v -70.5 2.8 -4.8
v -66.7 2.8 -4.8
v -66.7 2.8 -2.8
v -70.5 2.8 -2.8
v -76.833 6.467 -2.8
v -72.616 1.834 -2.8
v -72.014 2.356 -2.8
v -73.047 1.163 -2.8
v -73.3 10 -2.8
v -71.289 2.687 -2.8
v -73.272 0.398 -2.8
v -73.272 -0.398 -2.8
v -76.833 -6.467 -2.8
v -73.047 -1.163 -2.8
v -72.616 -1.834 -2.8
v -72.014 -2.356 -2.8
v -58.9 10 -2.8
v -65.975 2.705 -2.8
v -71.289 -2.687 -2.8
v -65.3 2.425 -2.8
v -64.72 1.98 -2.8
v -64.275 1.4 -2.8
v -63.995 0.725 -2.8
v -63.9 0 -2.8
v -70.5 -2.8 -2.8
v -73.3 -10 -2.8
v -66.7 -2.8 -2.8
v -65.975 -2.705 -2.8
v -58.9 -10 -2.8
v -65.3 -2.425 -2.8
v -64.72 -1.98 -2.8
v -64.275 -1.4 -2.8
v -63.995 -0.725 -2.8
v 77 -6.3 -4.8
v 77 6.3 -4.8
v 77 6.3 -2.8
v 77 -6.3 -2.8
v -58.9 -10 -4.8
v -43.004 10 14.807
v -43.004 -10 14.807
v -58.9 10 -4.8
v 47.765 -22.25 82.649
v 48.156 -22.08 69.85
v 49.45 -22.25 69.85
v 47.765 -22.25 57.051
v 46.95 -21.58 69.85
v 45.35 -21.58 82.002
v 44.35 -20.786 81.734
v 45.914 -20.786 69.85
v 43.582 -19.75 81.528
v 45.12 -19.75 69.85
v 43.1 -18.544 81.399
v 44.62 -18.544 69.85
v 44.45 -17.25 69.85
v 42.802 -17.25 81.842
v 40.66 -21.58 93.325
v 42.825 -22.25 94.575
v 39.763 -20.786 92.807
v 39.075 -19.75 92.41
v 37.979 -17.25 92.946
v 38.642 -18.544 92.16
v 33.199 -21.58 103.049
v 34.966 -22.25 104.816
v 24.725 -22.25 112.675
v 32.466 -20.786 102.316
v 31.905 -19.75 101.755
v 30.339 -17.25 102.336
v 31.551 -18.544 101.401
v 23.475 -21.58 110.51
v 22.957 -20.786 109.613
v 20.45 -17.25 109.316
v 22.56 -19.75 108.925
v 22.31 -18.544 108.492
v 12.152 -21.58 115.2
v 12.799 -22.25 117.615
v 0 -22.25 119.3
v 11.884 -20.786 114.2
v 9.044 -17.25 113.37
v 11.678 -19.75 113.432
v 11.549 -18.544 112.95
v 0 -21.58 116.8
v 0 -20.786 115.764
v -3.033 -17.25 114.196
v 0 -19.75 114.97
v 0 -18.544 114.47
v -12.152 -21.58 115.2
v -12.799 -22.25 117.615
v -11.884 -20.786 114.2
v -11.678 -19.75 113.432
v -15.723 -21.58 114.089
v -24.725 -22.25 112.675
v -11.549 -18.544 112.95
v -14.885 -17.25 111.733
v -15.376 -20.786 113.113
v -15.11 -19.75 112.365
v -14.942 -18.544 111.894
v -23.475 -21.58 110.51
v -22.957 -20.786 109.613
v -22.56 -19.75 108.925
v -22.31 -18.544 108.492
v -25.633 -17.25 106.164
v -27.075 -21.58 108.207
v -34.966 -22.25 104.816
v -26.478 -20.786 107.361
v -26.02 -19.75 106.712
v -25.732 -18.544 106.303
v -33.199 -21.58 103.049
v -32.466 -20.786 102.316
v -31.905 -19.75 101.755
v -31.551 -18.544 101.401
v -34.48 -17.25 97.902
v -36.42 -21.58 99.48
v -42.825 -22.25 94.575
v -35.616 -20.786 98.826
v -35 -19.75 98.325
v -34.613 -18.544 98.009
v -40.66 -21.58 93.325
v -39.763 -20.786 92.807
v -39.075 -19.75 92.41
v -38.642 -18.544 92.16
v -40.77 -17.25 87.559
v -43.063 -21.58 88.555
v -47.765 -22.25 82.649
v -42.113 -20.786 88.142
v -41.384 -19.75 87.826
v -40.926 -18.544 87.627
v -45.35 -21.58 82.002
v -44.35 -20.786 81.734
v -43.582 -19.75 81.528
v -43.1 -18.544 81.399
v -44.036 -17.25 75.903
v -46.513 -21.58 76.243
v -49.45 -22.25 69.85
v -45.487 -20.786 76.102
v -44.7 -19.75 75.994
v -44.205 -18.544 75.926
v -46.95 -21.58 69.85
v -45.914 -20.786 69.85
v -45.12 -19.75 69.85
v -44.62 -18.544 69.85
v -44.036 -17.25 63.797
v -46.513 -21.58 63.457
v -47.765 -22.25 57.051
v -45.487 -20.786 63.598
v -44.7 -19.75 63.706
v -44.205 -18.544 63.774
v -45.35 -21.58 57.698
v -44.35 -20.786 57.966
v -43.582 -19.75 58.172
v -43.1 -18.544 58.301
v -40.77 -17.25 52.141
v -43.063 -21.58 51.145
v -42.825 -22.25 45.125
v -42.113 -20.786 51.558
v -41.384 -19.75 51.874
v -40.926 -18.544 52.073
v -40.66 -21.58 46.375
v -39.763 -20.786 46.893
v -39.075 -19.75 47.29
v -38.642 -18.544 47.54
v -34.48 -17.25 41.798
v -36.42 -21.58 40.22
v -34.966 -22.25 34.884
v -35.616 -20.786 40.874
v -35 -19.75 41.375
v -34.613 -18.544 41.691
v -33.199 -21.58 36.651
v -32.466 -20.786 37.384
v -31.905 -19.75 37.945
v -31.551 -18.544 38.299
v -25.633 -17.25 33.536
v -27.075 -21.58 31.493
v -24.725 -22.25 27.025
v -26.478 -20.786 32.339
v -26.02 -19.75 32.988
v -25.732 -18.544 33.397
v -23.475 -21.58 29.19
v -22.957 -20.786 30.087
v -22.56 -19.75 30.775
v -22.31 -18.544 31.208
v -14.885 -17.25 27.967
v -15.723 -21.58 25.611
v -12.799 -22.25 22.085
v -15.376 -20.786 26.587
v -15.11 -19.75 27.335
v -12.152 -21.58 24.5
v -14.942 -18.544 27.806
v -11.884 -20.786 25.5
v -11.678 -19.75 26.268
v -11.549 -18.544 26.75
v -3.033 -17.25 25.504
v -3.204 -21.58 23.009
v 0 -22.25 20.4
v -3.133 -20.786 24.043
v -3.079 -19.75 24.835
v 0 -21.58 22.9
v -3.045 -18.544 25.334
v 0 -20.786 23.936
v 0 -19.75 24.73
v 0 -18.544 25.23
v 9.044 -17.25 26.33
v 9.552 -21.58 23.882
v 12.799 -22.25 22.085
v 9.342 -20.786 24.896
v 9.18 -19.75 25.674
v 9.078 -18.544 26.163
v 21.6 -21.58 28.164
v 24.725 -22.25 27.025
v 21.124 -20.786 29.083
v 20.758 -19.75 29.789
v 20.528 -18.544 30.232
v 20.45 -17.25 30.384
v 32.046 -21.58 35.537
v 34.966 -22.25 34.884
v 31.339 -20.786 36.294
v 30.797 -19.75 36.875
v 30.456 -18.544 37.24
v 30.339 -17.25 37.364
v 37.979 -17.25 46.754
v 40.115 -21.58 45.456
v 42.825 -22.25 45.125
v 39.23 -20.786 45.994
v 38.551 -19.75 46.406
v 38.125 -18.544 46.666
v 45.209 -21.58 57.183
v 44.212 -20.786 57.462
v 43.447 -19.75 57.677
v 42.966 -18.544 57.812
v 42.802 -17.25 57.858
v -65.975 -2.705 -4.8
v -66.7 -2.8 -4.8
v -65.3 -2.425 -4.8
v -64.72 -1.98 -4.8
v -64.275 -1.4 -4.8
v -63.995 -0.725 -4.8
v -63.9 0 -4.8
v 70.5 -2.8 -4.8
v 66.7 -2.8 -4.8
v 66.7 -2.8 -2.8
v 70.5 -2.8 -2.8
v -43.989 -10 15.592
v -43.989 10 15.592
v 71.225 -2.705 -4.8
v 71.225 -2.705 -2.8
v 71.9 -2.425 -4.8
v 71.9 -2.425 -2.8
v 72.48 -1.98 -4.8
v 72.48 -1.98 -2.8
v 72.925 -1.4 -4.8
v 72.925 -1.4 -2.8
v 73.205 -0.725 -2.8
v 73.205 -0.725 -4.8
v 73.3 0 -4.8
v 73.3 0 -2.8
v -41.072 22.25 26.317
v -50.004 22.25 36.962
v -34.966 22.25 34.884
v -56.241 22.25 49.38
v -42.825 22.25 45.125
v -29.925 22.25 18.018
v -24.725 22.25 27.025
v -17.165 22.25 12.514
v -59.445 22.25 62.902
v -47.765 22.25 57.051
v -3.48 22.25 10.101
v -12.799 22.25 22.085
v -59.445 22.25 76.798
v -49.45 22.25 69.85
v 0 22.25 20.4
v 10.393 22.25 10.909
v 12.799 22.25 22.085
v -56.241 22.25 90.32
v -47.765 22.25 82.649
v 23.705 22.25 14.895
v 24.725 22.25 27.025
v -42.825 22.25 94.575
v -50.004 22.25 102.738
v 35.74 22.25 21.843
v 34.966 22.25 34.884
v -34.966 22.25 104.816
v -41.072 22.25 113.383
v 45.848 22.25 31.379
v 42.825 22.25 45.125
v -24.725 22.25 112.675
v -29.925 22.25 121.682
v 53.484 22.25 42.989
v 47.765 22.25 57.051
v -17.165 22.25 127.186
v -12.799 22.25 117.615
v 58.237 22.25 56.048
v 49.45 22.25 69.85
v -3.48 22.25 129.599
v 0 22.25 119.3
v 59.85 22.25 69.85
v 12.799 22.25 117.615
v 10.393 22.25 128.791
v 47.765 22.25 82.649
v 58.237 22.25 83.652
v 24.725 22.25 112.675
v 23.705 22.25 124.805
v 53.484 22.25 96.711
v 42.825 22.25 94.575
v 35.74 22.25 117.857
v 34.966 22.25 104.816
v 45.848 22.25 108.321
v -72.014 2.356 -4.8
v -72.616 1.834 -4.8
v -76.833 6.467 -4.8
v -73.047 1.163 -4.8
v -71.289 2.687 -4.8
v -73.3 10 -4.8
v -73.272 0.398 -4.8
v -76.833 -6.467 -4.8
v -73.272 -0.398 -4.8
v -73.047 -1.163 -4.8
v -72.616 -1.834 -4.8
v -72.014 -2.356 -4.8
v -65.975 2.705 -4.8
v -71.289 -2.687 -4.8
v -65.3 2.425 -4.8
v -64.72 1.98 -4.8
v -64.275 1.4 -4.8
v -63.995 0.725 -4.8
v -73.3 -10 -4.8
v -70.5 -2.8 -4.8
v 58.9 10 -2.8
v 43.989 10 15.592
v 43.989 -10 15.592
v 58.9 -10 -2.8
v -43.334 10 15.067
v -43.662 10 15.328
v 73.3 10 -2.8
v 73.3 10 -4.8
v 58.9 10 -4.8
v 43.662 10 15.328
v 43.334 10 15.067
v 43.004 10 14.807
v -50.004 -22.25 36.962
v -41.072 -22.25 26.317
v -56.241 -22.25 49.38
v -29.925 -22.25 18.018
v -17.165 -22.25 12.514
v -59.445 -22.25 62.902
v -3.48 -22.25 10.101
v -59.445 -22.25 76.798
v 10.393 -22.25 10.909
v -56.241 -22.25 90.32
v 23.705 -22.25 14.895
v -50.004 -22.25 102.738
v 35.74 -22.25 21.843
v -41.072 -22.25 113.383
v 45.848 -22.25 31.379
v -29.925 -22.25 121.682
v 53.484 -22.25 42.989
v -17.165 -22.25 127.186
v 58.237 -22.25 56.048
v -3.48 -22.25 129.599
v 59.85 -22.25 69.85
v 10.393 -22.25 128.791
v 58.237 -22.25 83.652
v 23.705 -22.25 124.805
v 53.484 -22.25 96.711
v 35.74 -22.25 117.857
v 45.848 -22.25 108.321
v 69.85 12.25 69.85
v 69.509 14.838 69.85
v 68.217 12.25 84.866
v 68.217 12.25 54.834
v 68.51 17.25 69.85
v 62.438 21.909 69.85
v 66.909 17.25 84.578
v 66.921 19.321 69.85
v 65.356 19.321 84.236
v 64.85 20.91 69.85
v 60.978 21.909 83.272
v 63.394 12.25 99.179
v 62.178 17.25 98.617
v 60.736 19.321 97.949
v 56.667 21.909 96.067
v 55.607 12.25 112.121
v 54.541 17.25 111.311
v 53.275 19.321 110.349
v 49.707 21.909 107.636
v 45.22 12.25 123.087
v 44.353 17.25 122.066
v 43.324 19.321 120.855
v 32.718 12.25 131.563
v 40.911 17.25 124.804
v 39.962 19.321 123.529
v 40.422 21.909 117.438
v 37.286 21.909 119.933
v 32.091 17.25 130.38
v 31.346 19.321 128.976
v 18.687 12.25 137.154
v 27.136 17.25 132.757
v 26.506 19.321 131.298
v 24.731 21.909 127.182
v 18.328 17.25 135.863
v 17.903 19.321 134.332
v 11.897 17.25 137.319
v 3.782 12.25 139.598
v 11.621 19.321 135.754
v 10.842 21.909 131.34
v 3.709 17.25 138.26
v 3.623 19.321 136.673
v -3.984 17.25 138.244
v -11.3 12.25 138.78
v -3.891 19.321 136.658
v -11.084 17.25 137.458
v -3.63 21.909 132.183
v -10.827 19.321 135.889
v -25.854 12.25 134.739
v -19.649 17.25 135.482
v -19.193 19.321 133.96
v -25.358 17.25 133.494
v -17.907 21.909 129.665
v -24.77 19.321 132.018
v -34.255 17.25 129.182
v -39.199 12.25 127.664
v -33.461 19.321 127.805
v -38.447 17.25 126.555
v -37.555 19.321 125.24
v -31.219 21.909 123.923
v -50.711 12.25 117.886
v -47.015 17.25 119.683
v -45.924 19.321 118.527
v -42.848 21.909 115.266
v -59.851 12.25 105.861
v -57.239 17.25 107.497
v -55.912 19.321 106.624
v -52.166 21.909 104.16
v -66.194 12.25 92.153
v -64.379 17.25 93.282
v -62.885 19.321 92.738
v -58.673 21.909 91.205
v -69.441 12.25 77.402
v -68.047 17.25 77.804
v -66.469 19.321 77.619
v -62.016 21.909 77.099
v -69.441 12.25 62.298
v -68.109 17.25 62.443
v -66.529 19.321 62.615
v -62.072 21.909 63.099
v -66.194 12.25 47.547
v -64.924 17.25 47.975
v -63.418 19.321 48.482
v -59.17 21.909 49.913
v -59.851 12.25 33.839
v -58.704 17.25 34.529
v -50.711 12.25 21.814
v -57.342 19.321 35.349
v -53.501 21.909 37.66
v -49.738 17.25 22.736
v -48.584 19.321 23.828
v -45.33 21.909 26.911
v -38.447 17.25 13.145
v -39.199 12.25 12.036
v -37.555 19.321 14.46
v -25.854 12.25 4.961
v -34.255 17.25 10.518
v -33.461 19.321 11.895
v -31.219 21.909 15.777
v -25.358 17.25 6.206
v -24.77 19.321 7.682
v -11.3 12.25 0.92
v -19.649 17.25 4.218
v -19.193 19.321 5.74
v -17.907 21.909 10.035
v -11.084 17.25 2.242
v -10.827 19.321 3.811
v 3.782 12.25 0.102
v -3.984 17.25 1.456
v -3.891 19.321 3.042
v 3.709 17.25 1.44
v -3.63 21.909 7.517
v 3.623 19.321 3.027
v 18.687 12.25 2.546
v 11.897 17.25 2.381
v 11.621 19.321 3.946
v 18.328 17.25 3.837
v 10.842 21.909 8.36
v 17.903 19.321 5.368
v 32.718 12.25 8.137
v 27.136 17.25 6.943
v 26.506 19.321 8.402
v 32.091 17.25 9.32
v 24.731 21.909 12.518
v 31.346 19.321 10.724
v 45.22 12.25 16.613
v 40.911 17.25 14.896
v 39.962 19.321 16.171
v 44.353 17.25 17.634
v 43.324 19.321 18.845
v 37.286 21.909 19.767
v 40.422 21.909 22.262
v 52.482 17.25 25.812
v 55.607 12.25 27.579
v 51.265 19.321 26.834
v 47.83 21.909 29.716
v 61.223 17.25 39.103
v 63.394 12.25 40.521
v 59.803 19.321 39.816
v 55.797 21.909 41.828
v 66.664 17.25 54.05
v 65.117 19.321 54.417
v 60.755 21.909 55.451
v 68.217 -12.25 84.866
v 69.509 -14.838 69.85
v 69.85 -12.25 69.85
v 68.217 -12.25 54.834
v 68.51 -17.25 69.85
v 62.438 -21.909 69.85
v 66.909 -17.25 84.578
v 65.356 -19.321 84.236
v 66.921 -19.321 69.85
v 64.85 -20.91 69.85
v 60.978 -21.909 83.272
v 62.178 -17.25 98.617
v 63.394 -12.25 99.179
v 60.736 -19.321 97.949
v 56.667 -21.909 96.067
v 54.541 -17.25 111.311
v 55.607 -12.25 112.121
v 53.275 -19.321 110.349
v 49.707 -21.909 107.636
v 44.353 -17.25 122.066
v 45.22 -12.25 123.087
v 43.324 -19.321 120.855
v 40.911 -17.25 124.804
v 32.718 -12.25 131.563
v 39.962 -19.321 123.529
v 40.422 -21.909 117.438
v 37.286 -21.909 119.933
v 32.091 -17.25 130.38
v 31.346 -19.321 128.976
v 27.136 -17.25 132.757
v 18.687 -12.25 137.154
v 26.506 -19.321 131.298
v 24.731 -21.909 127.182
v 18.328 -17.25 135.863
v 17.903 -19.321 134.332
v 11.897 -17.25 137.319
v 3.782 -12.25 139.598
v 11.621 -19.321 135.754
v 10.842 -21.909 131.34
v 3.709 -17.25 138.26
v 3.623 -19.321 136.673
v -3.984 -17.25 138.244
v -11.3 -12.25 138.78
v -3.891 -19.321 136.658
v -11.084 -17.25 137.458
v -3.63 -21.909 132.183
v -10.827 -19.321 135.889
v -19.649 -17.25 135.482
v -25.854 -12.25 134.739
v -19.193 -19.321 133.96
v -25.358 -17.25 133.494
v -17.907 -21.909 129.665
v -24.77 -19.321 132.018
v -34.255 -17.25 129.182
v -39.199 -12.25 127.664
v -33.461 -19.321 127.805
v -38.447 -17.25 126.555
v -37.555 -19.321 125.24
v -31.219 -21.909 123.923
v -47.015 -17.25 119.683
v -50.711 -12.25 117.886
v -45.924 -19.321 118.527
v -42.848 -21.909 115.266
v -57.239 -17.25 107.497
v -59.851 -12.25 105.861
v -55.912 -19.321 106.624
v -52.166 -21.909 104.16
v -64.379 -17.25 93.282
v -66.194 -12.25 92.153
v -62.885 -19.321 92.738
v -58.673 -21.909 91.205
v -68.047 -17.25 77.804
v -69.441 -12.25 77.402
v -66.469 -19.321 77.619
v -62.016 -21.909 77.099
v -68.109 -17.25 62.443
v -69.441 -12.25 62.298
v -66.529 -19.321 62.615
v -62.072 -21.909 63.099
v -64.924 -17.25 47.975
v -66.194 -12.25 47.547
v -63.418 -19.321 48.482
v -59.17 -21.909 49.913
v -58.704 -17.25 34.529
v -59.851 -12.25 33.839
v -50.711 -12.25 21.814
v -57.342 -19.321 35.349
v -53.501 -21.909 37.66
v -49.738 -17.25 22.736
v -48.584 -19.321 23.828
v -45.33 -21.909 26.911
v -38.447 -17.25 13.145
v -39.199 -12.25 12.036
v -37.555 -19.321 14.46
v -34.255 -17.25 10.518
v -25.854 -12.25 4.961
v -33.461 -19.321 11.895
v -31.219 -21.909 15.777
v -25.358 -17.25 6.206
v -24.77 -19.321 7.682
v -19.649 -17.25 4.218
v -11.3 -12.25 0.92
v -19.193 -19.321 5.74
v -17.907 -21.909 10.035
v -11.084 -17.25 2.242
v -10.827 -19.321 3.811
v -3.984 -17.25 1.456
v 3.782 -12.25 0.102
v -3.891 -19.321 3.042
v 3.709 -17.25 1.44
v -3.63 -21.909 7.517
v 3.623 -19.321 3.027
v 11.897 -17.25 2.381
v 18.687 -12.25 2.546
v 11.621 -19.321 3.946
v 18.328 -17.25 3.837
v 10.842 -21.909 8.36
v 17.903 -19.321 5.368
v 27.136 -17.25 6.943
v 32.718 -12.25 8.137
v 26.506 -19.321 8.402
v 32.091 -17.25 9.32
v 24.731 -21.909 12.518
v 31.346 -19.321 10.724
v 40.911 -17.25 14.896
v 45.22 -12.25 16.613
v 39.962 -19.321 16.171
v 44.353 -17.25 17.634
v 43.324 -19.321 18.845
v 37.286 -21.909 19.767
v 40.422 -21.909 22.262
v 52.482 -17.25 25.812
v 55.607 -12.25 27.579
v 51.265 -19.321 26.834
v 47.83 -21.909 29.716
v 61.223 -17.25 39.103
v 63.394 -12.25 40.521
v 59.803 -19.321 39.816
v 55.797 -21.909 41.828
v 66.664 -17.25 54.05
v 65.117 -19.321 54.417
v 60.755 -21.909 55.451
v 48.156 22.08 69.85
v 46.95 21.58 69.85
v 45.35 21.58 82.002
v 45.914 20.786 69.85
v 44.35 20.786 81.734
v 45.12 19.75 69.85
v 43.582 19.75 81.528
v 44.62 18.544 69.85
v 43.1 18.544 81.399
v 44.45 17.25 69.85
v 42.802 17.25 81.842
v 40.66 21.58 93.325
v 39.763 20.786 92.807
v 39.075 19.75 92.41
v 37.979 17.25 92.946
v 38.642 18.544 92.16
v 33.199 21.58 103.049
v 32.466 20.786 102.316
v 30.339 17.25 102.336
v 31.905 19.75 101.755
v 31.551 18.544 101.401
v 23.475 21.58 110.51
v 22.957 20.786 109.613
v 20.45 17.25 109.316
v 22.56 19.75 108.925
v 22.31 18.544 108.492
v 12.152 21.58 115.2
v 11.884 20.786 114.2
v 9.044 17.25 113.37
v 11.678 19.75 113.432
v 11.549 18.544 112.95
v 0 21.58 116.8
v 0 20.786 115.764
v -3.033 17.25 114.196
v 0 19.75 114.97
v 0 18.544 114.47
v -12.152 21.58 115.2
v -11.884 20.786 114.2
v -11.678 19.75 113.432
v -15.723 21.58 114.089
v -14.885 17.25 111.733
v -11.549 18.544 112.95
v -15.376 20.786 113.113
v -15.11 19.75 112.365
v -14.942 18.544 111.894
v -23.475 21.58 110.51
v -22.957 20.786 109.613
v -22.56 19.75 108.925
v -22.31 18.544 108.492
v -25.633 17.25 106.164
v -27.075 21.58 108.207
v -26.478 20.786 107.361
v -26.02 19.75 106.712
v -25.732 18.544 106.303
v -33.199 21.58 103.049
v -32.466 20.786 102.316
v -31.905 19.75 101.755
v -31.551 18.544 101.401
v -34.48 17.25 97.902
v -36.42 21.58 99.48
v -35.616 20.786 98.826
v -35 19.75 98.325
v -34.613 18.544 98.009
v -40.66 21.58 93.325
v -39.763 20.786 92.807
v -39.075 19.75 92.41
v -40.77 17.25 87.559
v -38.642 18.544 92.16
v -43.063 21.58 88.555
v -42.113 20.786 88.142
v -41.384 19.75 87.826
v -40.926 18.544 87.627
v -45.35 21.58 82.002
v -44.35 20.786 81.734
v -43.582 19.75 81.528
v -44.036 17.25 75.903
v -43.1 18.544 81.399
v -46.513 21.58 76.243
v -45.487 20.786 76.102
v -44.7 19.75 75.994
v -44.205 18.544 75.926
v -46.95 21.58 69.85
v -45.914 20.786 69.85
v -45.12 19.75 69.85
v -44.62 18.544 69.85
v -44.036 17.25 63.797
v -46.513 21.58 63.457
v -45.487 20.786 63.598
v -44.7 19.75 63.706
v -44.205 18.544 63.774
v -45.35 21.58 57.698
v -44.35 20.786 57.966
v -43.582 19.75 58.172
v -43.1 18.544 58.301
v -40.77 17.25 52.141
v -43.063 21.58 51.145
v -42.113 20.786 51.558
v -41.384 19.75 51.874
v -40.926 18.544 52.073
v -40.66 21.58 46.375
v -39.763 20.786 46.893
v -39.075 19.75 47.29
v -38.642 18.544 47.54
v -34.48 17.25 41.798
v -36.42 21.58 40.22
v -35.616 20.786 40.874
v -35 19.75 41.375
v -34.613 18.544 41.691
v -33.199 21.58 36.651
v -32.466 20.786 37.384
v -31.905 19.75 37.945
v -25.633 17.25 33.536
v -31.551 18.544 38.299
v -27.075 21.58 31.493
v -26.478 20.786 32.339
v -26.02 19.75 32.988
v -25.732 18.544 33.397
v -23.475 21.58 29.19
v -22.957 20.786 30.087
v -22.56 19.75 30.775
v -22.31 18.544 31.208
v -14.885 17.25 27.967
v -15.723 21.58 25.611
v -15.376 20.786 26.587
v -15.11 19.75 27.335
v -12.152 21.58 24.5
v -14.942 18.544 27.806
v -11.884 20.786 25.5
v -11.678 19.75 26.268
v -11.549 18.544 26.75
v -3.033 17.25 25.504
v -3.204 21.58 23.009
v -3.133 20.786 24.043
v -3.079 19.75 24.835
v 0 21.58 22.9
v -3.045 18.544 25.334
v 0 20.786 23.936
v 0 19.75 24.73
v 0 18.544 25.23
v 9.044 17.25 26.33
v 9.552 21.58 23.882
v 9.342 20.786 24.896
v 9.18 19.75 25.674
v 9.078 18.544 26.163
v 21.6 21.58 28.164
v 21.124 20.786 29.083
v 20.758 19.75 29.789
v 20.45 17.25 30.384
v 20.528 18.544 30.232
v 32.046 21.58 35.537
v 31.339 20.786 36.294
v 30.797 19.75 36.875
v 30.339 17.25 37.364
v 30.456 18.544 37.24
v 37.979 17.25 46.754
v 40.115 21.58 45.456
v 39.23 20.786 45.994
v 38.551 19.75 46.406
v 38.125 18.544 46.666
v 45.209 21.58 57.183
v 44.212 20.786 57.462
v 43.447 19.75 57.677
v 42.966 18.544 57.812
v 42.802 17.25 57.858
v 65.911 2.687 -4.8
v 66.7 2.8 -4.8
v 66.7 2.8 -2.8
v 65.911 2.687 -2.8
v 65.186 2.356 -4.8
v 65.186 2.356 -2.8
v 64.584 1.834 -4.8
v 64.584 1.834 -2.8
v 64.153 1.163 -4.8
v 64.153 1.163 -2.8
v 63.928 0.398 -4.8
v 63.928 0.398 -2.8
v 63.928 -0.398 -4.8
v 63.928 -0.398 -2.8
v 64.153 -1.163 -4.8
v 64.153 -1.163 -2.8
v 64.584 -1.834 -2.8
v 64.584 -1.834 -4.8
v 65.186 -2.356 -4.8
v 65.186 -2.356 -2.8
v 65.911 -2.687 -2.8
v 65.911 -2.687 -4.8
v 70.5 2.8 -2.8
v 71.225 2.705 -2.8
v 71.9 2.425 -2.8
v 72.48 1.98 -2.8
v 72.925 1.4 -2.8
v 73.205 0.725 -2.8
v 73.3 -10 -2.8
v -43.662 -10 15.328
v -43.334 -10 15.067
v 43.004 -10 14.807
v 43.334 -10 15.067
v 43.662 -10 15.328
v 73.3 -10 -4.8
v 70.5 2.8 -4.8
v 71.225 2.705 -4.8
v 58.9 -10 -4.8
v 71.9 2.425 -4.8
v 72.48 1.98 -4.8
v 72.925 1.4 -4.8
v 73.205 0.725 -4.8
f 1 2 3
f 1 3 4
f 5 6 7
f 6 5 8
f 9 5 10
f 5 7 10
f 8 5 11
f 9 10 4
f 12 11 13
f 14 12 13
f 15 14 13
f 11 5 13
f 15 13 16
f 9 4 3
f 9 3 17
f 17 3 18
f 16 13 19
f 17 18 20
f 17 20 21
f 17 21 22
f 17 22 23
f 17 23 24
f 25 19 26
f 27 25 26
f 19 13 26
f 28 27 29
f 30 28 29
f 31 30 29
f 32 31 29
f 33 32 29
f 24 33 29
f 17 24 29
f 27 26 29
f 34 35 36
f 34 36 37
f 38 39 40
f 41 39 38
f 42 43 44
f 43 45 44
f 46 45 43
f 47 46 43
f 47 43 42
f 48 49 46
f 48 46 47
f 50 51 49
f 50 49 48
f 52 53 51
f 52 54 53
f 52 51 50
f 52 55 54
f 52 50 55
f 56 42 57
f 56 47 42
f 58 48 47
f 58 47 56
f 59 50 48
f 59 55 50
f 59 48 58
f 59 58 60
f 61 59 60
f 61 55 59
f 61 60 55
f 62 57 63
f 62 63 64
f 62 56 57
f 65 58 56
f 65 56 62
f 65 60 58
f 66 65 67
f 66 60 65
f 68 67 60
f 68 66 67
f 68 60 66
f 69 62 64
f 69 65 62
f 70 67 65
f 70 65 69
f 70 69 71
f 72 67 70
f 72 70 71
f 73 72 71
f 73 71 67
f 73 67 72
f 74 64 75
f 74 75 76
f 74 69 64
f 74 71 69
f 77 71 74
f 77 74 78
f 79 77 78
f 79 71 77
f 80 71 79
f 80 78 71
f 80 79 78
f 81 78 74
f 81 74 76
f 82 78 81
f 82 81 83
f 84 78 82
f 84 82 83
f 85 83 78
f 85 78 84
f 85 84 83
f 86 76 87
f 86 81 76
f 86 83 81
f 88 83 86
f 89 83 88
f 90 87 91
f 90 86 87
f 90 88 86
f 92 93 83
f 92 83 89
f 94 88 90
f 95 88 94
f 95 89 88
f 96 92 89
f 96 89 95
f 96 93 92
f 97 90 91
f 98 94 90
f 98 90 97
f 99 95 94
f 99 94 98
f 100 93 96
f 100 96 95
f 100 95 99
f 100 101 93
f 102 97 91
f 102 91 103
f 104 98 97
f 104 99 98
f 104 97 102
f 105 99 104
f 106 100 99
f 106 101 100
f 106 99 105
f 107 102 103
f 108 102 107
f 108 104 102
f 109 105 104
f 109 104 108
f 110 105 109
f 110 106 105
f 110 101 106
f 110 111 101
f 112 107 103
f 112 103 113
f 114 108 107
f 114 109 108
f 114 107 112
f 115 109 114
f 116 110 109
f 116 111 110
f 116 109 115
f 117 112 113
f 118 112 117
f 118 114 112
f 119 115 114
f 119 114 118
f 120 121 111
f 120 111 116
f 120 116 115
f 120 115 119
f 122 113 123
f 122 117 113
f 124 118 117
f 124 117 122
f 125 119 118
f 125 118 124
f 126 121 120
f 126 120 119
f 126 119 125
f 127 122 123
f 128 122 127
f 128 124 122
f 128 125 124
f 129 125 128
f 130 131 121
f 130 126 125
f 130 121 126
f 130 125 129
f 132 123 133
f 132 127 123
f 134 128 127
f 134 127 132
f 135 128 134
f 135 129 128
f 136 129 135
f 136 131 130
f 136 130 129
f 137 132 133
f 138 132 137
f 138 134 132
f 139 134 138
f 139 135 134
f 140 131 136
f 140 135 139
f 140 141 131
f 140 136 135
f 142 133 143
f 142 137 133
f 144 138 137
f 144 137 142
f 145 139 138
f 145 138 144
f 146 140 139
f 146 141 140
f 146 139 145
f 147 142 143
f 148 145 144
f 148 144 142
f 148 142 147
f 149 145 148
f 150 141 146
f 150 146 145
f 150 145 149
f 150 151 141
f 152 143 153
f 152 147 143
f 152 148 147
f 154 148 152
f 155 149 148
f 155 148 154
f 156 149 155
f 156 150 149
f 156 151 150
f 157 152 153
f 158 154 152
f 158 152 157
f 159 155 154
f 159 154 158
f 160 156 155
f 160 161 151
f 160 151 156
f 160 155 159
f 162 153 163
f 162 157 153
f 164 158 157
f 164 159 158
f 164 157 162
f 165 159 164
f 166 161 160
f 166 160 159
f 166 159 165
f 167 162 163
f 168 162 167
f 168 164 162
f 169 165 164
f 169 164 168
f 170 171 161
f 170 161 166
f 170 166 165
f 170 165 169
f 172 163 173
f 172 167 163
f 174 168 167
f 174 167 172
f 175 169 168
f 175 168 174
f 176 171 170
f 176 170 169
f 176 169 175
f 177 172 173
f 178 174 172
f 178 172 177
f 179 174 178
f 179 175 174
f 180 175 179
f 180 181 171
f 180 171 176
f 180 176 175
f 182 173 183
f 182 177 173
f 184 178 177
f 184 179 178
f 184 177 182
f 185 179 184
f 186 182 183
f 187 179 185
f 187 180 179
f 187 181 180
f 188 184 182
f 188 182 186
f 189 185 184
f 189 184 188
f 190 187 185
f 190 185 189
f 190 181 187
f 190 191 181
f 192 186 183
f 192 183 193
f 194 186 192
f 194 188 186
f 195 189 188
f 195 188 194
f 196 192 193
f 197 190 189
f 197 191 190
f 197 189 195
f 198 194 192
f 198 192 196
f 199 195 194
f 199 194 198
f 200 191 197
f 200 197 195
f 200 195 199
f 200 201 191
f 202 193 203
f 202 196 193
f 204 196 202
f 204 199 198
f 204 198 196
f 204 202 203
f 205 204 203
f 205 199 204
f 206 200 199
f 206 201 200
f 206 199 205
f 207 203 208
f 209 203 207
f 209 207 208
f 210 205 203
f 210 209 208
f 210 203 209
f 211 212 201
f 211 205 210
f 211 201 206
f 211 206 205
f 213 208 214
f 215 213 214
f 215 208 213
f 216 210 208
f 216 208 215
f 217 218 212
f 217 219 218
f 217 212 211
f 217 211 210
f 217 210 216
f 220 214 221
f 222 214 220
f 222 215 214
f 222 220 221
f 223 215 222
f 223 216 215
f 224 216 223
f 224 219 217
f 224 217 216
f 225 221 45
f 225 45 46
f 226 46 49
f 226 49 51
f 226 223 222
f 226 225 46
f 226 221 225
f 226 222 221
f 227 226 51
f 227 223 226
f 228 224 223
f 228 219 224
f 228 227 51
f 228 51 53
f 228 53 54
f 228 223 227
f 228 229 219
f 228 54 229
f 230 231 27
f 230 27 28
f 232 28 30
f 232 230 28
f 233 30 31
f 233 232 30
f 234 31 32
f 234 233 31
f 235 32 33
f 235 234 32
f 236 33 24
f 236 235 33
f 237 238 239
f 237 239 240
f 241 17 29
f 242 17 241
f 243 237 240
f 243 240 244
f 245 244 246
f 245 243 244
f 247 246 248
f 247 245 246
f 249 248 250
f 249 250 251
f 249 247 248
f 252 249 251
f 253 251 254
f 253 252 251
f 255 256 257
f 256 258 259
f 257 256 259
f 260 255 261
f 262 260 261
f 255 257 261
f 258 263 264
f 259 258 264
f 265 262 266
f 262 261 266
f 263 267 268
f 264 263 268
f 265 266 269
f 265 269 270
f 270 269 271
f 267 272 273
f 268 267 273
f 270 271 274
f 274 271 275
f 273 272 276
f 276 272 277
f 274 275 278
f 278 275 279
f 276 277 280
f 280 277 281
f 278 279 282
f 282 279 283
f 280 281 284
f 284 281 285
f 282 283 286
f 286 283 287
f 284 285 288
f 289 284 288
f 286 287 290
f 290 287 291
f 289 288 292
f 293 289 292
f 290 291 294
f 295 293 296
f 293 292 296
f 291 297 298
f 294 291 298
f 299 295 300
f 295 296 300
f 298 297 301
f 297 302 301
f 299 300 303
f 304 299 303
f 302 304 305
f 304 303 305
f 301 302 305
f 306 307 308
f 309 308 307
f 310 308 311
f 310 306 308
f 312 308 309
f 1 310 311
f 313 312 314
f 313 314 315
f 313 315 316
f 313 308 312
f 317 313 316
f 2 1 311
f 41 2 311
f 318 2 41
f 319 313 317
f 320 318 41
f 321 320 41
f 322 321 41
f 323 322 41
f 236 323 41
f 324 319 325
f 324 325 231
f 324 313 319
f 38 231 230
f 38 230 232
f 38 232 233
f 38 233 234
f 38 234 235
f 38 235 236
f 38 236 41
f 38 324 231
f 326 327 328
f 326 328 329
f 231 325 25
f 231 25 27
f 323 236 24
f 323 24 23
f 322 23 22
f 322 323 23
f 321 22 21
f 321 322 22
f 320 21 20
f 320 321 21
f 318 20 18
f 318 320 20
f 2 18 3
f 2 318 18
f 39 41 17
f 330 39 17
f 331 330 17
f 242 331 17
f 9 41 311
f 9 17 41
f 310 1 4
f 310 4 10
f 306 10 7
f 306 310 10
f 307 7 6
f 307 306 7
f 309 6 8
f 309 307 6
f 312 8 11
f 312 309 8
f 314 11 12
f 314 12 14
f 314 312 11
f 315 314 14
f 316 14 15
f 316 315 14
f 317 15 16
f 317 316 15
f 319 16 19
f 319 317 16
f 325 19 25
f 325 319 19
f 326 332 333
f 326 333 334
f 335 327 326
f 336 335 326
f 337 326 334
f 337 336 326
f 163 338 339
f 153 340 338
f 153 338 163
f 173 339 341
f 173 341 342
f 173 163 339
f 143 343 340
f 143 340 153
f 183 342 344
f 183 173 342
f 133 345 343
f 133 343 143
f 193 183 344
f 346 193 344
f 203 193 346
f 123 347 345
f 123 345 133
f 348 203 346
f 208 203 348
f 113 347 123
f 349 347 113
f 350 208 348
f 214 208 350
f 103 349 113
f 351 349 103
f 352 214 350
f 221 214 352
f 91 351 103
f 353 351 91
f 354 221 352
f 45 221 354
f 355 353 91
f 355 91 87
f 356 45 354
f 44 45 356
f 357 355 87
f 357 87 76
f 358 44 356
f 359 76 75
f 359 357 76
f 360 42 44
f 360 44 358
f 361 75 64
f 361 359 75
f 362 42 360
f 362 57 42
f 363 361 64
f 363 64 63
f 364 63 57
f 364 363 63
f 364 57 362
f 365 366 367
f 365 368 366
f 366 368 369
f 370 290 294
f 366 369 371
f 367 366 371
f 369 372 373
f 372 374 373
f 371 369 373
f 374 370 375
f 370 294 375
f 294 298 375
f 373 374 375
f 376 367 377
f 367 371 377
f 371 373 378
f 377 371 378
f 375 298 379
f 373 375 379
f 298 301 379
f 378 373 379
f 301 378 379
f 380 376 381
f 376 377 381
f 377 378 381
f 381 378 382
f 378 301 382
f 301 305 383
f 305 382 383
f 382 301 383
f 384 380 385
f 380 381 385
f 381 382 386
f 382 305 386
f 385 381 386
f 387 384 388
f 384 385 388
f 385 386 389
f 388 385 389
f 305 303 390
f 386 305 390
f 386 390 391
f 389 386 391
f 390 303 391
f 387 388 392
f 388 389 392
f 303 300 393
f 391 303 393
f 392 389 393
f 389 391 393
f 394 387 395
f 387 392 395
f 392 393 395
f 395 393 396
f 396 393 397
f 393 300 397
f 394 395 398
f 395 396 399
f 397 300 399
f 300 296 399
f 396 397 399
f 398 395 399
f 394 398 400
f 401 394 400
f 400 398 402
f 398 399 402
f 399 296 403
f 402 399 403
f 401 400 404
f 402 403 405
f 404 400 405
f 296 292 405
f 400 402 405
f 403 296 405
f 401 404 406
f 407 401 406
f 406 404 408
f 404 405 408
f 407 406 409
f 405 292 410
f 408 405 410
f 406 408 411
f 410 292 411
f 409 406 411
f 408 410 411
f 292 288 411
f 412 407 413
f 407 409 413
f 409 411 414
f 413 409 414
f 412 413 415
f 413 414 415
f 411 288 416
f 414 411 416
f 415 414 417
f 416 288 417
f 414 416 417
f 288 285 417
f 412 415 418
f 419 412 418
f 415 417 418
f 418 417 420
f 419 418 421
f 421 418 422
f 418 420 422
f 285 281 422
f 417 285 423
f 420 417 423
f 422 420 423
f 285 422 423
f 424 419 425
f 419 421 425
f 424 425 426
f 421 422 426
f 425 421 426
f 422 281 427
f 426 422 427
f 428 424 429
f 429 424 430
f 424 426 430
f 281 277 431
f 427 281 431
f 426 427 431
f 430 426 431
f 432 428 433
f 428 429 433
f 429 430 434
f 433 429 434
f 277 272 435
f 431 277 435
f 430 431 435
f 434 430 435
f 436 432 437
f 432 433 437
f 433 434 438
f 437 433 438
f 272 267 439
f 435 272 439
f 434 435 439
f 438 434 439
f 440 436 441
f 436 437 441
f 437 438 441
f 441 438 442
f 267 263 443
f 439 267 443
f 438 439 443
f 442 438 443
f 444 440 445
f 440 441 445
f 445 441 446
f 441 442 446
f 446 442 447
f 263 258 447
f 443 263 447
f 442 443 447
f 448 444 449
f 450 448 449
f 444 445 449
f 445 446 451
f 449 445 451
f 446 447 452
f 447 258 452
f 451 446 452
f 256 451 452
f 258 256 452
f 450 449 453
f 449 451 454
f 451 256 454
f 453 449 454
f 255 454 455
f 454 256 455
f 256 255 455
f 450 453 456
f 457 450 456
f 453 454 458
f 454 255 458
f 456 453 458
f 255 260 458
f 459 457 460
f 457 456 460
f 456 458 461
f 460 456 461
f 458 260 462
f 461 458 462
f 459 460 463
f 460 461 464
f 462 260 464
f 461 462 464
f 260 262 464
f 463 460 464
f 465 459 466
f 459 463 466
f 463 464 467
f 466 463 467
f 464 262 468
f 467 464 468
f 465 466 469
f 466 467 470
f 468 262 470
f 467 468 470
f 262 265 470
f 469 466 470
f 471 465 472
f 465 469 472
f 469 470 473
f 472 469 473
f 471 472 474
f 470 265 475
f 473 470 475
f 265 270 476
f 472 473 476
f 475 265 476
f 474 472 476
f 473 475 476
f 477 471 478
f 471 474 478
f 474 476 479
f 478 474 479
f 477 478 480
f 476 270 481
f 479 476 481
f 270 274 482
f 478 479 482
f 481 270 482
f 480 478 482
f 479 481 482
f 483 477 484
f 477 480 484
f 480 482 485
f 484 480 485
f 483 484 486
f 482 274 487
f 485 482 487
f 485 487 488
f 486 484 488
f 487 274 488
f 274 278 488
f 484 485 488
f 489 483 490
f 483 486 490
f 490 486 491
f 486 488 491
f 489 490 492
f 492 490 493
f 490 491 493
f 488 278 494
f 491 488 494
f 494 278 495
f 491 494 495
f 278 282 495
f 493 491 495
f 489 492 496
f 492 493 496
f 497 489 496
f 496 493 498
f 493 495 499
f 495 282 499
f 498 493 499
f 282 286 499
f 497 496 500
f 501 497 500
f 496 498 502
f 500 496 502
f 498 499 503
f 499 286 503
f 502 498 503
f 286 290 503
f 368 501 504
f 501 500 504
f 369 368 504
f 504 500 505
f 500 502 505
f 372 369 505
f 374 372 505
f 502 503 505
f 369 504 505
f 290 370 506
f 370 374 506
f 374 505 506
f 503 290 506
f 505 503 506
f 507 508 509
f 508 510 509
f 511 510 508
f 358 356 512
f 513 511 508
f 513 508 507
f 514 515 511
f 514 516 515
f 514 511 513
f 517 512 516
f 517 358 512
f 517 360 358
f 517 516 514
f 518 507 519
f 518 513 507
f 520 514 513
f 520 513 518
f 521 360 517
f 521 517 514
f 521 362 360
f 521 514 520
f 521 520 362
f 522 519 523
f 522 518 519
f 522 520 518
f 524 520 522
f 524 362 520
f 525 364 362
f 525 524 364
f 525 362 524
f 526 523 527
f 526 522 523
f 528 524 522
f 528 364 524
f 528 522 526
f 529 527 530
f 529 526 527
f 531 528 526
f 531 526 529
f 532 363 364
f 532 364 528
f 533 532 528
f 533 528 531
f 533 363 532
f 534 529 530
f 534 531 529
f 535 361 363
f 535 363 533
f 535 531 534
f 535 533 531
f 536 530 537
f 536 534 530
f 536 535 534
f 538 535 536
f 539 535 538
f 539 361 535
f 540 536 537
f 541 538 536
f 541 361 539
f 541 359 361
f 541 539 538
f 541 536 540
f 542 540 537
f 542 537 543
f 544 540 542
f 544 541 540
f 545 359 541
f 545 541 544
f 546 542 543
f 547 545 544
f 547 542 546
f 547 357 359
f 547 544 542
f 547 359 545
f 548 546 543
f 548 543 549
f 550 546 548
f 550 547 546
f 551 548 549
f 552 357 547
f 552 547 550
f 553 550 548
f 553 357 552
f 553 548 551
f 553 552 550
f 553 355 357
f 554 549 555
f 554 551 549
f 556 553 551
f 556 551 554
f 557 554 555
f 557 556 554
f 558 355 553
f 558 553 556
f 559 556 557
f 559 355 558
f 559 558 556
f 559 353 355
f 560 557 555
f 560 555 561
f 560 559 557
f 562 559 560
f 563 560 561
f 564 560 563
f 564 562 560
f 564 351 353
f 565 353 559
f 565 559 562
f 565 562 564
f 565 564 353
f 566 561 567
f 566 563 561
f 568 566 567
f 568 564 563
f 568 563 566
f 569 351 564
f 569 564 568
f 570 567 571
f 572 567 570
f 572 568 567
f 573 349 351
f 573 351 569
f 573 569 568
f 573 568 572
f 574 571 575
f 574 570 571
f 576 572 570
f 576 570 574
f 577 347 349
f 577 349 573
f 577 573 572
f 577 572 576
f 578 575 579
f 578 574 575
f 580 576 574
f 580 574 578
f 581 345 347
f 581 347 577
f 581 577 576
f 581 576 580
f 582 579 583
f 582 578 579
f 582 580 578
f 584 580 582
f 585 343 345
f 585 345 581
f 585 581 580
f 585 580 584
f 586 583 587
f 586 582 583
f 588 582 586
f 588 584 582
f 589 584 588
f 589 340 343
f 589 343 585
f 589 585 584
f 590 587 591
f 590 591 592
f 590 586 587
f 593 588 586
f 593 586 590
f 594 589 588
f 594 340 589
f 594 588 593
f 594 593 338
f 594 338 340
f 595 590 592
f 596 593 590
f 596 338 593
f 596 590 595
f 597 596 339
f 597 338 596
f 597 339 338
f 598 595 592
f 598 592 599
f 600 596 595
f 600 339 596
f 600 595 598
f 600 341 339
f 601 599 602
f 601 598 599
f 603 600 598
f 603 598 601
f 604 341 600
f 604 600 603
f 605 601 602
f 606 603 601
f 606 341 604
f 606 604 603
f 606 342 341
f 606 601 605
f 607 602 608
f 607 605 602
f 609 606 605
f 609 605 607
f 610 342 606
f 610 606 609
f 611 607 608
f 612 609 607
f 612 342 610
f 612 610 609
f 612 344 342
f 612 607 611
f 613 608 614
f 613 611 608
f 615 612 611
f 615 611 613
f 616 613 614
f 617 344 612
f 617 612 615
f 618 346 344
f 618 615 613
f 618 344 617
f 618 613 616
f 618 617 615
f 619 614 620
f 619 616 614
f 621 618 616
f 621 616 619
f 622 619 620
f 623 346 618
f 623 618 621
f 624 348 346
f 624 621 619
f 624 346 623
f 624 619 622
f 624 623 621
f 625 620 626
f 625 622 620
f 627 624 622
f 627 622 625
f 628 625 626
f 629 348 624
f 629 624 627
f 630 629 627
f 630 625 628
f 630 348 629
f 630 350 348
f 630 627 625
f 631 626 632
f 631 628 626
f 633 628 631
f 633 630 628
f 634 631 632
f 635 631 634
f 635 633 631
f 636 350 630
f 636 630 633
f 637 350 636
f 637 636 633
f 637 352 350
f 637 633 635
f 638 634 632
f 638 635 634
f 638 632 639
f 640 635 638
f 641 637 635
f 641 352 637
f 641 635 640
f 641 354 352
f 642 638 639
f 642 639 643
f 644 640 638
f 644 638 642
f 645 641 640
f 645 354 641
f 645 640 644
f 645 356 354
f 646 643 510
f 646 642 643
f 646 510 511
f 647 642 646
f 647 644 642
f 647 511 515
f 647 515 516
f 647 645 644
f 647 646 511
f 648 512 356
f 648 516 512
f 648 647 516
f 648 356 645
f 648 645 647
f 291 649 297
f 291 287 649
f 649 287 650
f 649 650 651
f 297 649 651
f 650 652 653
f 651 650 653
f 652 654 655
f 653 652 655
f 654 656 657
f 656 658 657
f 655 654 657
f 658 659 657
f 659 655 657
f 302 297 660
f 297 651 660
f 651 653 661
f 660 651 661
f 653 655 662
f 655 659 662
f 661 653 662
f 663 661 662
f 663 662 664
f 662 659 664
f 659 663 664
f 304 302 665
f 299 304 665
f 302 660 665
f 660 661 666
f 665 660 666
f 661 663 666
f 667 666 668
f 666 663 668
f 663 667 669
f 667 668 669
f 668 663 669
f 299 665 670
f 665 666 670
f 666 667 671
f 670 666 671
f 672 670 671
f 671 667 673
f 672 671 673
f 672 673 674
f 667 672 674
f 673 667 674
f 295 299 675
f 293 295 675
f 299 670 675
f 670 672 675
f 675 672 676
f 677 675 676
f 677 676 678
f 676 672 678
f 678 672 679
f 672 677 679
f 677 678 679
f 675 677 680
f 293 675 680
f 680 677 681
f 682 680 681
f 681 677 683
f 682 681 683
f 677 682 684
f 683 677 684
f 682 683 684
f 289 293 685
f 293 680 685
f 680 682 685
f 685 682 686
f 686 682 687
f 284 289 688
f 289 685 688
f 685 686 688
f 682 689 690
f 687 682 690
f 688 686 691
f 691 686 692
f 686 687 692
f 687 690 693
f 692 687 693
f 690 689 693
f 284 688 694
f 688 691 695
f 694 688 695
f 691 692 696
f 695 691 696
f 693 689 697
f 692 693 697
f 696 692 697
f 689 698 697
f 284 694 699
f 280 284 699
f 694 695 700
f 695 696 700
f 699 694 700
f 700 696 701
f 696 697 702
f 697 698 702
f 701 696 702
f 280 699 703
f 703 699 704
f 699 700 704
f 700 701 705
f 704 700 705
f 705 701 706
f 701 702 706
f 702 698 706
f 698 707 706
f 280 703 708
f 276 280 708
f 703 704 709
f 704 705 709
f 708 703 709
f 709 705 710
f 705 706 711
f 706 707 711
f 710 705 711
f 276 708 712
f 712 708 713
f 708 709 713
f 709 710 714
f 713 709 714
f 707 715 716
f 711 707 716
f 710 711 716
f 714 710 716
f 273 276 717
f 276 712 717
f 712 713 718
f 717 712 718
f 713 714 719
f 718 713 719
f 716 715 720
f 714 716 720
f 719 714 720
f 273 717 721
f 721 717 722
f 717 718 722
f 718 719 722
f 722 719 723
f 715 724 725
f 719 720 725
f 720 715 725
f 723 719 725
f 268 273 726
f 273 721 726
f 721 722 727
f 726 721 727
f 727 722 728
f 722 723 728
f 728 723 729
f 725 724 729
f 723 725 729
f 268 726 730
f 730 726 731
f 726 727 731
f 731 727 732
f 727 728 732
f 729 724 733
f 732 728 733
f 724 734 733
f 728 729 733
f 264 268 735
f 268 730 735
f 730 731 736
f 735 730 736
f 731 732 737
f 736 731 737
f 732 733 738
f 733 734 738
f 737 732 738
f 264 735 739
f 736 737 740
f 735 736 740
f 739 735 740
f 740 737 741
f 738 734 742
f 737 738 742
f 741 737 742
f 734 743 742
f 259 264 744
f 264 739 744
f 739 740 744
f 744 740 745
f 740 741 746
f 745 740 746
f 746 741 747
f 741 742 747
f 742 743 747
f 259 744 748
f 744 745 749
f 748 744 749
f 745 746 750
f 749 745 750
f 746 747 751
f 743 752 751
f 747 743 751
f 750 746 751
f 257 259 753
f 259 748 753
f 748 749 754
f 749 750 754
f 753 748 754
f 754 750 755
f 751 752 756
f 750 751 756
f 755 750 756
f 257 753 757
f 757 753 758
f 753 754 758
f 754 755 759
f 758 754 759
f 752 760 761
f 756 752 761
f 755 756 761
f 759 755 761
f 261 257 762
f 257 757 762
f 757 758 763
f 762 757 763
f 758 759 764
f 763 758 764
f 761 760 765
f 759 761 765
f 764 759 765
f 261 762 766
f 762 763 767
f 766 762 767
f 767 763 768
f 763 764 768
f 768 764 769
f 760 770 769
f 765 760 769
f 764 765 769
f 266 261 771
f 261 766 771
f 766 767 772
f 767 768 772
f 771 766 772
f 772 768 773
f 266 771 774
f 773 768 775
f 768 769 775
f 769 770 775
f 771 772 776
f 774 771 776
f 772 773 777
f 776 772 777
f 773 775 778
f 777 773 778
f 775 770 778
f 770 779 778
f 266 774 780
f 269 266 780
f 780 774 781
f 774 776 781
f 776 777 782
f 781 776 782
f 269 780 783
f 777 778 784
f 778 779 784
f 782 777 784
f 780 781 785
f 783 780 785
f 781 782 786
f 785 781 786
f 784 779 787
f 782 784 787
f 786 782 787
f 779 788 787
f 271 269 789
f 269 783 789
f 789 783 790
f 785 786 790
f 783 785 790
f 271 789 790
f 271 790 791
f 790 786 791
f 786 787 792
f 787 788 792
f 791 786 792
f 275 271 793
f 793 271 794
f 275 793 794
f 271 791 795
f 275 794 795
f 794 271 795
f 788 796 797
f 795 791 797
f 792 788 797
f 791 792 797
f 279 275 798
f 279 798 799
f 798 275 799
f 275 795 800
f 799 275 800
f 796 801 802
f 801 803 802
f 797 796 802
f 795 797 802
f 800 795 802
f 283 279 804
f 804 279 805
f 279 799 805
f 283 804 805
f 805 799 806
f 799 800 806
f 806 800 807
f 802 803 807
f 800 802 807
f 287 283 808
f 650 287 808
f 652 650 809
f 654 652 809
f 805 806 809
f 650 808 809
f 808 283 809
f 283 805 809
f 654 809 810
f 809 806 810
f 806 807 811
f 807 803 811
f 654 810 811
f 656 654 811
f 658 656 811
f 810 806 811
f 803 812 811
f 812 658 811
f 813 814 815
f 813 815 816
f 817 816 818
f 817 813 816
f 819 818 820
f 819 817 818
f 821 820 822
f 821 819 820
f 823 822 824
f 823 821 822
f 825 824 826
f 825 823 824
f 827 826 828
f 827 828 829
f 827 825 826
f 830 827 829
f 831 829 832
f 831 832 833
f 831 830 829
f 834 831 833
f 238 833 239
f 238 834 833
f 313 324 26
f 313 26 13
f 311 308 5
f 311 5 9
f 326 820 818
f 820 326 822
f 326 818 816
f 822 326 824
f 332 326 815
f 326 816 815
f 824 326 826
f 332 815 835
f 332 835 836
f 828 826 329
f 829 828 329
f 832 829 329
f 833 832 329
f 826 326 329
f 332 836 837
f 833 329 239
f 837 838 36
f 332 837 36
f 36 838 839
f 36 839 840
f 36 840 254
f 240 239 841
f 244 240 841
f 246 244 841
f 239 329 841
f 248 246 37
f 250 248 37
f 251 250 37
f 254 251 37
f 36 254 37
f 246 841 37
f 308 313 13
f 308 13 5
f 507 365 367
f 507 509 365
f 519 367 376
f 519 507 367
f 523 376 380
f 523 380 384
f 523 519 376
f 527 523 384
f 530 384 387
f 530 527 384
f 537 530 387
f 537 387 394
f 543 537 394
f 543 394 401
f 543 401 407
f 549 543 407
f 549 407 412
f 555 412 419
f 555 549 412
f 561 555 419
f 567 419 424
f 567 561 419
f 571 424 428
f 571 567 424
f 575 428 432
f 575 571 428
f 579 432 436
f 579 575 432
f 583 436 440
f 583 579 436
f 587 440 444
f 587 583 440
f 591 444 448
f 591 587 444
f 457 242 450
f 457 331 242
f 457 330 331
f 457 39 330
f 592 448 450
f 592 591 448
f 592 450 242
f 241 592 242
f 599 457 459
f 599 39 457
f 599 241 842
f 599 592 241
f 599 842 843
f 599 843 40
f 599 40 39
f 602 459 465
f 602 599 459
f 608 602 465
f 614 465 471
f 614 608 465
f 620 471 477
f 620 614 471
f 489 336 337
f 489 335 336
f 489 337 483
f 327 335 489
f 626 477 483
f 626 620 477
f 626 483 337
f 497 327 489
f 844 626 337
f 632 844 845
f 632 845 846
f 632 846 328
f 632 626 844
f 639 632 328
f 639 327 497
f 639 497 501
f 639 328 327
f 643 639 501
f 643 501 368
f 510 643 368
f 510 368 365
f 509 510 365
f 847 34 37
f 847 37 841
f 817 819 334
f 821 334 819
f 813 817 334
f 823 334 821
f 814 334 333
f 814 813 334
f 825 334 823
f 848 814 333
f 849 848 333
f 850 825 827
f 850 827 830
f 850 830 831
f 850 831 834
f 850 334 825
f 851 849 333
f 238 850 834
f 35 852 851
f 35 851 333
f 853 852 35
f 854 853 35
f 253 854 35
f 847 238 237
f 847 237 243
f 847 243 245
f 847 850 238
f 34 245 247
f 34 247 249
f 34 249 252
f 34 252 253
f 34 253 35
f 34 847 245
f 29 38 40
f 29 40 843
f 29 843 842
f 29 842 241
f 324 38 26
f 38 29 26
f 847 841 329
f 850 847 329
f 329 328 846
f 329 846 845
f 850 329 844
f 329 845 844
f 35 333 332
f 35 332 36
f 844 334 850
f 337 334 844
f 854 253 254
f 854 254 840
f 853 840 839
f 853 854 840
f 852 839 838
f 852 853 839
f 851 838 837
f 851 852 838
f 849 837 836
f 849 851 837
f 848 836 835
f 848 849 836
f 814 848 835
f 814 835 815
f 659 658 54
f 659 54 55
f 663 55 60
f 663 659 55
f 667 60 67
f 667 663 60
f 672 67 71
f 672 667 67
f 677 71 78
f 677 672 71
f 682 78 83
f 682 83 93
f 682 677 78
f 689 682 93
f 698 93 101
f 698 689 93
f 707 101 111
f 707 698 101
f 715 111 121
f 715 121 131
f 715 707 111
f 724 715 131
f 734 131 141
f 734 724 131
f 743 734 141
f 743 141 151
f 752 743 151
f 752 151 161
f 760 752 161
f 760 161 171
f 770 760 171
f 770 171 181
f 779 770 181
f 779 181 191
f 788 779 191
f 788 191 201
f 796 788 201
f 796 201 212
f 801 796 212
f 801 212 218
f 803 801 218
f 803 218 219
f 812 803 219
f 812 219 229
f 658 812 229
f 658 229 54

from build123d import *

# Parameters (mm, degrees)
F0_R     = 69.85
F0_R_2   = 44.45
F1_DEPTH = 22.25
F2_R     = 10
F3_R     = 5
F7_DEPTH = 2
F9_DEPTH = 20


with BuildPart() as f1:
    # F0 (on Front) → F1 (new body, symmetric)
    with BuildSketch(Plane.XZ):
        with Locations((0, 69.85)):
            Circle(F0_R)
        with Locations((0, 69.85)):
            Circle(F0_R_2, mode=Mode.SUBTRACT)
    extrude(amount=F1_DEPTH, both=True)

    # F2
    f2_edges = [f1.edges().sort_by_distance(p)[0] for p in [
        (-69.85, -22.25, 69.85),
        (-69.85, 22.25, 69.85),
    ]]
    fillet(f2_edges, radius=F2_R)

    # F3
    f3_edges = [f1.edges().sort_by_distance(p)[0] for p in [
        (-44.45, 22.25, 69.85),
        (-44.45, -22.25, 69.85),
    ]]
    fillet(f3_edges, radius=F3_R)



with BuildPart() as f7:
    # F5 (on face) → F7 (new body)
    with BuildSketch(Plane(origin=(0, 0, -4.8), x_dir=(1, 0, 0), z_dir=(0, 0, -1))):
        with BuildLine():
            Line((58.9, 10), (58.9, -10))
            Line((58.9, -10), (67.5496086478, -10))
            Line((67.5496086478, -10), (67.5496086478, -2.8))
            Line((67.5496086478, -2.8), (66.7, -2.8))
            ThreePointArc((66.7, -2.8), (63.9, 0), (66.7, 2.8))
            Line((66.7, 2.8), (67.5496086478, 2.8))
            Line((67.5496086478, 2.8), (67.5496086478, 10))
            Line((67.5496086478, 10), (58.9, 10))
        make_face()
        with BuildLine():
            Line((67.5496086478, -2.8), (67.5496086478, -10))
            Line((67.5496086478, -10), (73.3, -10))
            Line((73.3, -10), (77, -6.3))
            Line((77, -6.3), (77, 6.3))
            Line((77, 6.3), (73.3, 10))
            Line((73.3, 10), (67.5496086478, 10))
            Line((67.5496086478, 10), (67.5496086478, 2.8))
            Line((67.5496086478, 2.8), (70.5, 2.8))
            ThreePointArc((70.5, 2.8), (72.4798989873, 1.9798989873), (73.3, 0))
            ThreePointArc((73.3, 0), (72.4798989873, -1.9798989873), (70.5, -2.8))
            Line((70.5, -2.8), (67.5496086478, -2.8))
        make_face()
    extrude(amount=-F7_DEPTH)


with BuildPart() as f7b:
    # F5 (on face) → F7, piece 2 (new body)
    with BuildSketch(Plane(origin=(0, 0, -4.8), x_dir=(1, 0, 0), z_dir=(0, 0, -1))):
        Polygon((-76.8326967955, 6.4673032045), (-76.8326967955, -6.4673032045), (-73.3, -10), (-58.9, -10), (-58.9, 10), (-73.3, 10), align=None)
        with BuildLine():
            ThreePointArc((-70.5, -2.8), (-73.3, 0), (-70.5, 2.8))
            Line((-70.5, 2.8), (-66.7, 2.8))
            ThreePointArc((-66.7, 2.8), (-64.7201010127, 1.9798989873), (-63.9, 0))
            ThreePointArc((-63.9, 0), (-64.7201010127, -1.9798989873), (-66.7, -2.8))
            Line((-66.7, -2.8), (-70.5, -2.8))
        make_face(mode=Mode.SUBTRACT)
    extrude(amount=-F7_DEPTH)


with BuildPart() as f1_1:
    add(f1.part)

    add(f7.part)  # F9 merges F7

    add(f7b.part)  # F9 merges F7b
    # F8 (on face) → F9 (join, through all)
    with BuildSketch(Plane(origin=(0, 10, 0), x_dir=(-1, 0, 0), z_dir=(0, 1, 0))):
        with BuildLine():
            Line((58.9, -2.8), (43.9892310261, 15.5916360942))
            ThreePointArc((43.9892310261, 15.5916360942), (43.4982300473, 15.1972188928), (43.0036928197, 14.8072447649))
            Line((43.0036928197, 14.8072447649), (58.9, -4.8))
            Line((58.9, -4.8), (58.9, -2.8))
        make_face()
        with BuildLine():
            ThreePointArc((-43.0036928197, 14.8072447649), (-43.4982300473, 15.1972188928), (-43.9892310261, 15.5916360942))
            Line((-43.9892310261, 15.5916360942), (-58.9, -2.8))
            Line((-58.9, -2.8), (-58.9, -4.8))
            Line((-58.9, -4.8), (-43.0036928197, 14.8072447649))
        make_face()
    extrude(amount=-F9_DEPTH)


solid = f1_1.part
